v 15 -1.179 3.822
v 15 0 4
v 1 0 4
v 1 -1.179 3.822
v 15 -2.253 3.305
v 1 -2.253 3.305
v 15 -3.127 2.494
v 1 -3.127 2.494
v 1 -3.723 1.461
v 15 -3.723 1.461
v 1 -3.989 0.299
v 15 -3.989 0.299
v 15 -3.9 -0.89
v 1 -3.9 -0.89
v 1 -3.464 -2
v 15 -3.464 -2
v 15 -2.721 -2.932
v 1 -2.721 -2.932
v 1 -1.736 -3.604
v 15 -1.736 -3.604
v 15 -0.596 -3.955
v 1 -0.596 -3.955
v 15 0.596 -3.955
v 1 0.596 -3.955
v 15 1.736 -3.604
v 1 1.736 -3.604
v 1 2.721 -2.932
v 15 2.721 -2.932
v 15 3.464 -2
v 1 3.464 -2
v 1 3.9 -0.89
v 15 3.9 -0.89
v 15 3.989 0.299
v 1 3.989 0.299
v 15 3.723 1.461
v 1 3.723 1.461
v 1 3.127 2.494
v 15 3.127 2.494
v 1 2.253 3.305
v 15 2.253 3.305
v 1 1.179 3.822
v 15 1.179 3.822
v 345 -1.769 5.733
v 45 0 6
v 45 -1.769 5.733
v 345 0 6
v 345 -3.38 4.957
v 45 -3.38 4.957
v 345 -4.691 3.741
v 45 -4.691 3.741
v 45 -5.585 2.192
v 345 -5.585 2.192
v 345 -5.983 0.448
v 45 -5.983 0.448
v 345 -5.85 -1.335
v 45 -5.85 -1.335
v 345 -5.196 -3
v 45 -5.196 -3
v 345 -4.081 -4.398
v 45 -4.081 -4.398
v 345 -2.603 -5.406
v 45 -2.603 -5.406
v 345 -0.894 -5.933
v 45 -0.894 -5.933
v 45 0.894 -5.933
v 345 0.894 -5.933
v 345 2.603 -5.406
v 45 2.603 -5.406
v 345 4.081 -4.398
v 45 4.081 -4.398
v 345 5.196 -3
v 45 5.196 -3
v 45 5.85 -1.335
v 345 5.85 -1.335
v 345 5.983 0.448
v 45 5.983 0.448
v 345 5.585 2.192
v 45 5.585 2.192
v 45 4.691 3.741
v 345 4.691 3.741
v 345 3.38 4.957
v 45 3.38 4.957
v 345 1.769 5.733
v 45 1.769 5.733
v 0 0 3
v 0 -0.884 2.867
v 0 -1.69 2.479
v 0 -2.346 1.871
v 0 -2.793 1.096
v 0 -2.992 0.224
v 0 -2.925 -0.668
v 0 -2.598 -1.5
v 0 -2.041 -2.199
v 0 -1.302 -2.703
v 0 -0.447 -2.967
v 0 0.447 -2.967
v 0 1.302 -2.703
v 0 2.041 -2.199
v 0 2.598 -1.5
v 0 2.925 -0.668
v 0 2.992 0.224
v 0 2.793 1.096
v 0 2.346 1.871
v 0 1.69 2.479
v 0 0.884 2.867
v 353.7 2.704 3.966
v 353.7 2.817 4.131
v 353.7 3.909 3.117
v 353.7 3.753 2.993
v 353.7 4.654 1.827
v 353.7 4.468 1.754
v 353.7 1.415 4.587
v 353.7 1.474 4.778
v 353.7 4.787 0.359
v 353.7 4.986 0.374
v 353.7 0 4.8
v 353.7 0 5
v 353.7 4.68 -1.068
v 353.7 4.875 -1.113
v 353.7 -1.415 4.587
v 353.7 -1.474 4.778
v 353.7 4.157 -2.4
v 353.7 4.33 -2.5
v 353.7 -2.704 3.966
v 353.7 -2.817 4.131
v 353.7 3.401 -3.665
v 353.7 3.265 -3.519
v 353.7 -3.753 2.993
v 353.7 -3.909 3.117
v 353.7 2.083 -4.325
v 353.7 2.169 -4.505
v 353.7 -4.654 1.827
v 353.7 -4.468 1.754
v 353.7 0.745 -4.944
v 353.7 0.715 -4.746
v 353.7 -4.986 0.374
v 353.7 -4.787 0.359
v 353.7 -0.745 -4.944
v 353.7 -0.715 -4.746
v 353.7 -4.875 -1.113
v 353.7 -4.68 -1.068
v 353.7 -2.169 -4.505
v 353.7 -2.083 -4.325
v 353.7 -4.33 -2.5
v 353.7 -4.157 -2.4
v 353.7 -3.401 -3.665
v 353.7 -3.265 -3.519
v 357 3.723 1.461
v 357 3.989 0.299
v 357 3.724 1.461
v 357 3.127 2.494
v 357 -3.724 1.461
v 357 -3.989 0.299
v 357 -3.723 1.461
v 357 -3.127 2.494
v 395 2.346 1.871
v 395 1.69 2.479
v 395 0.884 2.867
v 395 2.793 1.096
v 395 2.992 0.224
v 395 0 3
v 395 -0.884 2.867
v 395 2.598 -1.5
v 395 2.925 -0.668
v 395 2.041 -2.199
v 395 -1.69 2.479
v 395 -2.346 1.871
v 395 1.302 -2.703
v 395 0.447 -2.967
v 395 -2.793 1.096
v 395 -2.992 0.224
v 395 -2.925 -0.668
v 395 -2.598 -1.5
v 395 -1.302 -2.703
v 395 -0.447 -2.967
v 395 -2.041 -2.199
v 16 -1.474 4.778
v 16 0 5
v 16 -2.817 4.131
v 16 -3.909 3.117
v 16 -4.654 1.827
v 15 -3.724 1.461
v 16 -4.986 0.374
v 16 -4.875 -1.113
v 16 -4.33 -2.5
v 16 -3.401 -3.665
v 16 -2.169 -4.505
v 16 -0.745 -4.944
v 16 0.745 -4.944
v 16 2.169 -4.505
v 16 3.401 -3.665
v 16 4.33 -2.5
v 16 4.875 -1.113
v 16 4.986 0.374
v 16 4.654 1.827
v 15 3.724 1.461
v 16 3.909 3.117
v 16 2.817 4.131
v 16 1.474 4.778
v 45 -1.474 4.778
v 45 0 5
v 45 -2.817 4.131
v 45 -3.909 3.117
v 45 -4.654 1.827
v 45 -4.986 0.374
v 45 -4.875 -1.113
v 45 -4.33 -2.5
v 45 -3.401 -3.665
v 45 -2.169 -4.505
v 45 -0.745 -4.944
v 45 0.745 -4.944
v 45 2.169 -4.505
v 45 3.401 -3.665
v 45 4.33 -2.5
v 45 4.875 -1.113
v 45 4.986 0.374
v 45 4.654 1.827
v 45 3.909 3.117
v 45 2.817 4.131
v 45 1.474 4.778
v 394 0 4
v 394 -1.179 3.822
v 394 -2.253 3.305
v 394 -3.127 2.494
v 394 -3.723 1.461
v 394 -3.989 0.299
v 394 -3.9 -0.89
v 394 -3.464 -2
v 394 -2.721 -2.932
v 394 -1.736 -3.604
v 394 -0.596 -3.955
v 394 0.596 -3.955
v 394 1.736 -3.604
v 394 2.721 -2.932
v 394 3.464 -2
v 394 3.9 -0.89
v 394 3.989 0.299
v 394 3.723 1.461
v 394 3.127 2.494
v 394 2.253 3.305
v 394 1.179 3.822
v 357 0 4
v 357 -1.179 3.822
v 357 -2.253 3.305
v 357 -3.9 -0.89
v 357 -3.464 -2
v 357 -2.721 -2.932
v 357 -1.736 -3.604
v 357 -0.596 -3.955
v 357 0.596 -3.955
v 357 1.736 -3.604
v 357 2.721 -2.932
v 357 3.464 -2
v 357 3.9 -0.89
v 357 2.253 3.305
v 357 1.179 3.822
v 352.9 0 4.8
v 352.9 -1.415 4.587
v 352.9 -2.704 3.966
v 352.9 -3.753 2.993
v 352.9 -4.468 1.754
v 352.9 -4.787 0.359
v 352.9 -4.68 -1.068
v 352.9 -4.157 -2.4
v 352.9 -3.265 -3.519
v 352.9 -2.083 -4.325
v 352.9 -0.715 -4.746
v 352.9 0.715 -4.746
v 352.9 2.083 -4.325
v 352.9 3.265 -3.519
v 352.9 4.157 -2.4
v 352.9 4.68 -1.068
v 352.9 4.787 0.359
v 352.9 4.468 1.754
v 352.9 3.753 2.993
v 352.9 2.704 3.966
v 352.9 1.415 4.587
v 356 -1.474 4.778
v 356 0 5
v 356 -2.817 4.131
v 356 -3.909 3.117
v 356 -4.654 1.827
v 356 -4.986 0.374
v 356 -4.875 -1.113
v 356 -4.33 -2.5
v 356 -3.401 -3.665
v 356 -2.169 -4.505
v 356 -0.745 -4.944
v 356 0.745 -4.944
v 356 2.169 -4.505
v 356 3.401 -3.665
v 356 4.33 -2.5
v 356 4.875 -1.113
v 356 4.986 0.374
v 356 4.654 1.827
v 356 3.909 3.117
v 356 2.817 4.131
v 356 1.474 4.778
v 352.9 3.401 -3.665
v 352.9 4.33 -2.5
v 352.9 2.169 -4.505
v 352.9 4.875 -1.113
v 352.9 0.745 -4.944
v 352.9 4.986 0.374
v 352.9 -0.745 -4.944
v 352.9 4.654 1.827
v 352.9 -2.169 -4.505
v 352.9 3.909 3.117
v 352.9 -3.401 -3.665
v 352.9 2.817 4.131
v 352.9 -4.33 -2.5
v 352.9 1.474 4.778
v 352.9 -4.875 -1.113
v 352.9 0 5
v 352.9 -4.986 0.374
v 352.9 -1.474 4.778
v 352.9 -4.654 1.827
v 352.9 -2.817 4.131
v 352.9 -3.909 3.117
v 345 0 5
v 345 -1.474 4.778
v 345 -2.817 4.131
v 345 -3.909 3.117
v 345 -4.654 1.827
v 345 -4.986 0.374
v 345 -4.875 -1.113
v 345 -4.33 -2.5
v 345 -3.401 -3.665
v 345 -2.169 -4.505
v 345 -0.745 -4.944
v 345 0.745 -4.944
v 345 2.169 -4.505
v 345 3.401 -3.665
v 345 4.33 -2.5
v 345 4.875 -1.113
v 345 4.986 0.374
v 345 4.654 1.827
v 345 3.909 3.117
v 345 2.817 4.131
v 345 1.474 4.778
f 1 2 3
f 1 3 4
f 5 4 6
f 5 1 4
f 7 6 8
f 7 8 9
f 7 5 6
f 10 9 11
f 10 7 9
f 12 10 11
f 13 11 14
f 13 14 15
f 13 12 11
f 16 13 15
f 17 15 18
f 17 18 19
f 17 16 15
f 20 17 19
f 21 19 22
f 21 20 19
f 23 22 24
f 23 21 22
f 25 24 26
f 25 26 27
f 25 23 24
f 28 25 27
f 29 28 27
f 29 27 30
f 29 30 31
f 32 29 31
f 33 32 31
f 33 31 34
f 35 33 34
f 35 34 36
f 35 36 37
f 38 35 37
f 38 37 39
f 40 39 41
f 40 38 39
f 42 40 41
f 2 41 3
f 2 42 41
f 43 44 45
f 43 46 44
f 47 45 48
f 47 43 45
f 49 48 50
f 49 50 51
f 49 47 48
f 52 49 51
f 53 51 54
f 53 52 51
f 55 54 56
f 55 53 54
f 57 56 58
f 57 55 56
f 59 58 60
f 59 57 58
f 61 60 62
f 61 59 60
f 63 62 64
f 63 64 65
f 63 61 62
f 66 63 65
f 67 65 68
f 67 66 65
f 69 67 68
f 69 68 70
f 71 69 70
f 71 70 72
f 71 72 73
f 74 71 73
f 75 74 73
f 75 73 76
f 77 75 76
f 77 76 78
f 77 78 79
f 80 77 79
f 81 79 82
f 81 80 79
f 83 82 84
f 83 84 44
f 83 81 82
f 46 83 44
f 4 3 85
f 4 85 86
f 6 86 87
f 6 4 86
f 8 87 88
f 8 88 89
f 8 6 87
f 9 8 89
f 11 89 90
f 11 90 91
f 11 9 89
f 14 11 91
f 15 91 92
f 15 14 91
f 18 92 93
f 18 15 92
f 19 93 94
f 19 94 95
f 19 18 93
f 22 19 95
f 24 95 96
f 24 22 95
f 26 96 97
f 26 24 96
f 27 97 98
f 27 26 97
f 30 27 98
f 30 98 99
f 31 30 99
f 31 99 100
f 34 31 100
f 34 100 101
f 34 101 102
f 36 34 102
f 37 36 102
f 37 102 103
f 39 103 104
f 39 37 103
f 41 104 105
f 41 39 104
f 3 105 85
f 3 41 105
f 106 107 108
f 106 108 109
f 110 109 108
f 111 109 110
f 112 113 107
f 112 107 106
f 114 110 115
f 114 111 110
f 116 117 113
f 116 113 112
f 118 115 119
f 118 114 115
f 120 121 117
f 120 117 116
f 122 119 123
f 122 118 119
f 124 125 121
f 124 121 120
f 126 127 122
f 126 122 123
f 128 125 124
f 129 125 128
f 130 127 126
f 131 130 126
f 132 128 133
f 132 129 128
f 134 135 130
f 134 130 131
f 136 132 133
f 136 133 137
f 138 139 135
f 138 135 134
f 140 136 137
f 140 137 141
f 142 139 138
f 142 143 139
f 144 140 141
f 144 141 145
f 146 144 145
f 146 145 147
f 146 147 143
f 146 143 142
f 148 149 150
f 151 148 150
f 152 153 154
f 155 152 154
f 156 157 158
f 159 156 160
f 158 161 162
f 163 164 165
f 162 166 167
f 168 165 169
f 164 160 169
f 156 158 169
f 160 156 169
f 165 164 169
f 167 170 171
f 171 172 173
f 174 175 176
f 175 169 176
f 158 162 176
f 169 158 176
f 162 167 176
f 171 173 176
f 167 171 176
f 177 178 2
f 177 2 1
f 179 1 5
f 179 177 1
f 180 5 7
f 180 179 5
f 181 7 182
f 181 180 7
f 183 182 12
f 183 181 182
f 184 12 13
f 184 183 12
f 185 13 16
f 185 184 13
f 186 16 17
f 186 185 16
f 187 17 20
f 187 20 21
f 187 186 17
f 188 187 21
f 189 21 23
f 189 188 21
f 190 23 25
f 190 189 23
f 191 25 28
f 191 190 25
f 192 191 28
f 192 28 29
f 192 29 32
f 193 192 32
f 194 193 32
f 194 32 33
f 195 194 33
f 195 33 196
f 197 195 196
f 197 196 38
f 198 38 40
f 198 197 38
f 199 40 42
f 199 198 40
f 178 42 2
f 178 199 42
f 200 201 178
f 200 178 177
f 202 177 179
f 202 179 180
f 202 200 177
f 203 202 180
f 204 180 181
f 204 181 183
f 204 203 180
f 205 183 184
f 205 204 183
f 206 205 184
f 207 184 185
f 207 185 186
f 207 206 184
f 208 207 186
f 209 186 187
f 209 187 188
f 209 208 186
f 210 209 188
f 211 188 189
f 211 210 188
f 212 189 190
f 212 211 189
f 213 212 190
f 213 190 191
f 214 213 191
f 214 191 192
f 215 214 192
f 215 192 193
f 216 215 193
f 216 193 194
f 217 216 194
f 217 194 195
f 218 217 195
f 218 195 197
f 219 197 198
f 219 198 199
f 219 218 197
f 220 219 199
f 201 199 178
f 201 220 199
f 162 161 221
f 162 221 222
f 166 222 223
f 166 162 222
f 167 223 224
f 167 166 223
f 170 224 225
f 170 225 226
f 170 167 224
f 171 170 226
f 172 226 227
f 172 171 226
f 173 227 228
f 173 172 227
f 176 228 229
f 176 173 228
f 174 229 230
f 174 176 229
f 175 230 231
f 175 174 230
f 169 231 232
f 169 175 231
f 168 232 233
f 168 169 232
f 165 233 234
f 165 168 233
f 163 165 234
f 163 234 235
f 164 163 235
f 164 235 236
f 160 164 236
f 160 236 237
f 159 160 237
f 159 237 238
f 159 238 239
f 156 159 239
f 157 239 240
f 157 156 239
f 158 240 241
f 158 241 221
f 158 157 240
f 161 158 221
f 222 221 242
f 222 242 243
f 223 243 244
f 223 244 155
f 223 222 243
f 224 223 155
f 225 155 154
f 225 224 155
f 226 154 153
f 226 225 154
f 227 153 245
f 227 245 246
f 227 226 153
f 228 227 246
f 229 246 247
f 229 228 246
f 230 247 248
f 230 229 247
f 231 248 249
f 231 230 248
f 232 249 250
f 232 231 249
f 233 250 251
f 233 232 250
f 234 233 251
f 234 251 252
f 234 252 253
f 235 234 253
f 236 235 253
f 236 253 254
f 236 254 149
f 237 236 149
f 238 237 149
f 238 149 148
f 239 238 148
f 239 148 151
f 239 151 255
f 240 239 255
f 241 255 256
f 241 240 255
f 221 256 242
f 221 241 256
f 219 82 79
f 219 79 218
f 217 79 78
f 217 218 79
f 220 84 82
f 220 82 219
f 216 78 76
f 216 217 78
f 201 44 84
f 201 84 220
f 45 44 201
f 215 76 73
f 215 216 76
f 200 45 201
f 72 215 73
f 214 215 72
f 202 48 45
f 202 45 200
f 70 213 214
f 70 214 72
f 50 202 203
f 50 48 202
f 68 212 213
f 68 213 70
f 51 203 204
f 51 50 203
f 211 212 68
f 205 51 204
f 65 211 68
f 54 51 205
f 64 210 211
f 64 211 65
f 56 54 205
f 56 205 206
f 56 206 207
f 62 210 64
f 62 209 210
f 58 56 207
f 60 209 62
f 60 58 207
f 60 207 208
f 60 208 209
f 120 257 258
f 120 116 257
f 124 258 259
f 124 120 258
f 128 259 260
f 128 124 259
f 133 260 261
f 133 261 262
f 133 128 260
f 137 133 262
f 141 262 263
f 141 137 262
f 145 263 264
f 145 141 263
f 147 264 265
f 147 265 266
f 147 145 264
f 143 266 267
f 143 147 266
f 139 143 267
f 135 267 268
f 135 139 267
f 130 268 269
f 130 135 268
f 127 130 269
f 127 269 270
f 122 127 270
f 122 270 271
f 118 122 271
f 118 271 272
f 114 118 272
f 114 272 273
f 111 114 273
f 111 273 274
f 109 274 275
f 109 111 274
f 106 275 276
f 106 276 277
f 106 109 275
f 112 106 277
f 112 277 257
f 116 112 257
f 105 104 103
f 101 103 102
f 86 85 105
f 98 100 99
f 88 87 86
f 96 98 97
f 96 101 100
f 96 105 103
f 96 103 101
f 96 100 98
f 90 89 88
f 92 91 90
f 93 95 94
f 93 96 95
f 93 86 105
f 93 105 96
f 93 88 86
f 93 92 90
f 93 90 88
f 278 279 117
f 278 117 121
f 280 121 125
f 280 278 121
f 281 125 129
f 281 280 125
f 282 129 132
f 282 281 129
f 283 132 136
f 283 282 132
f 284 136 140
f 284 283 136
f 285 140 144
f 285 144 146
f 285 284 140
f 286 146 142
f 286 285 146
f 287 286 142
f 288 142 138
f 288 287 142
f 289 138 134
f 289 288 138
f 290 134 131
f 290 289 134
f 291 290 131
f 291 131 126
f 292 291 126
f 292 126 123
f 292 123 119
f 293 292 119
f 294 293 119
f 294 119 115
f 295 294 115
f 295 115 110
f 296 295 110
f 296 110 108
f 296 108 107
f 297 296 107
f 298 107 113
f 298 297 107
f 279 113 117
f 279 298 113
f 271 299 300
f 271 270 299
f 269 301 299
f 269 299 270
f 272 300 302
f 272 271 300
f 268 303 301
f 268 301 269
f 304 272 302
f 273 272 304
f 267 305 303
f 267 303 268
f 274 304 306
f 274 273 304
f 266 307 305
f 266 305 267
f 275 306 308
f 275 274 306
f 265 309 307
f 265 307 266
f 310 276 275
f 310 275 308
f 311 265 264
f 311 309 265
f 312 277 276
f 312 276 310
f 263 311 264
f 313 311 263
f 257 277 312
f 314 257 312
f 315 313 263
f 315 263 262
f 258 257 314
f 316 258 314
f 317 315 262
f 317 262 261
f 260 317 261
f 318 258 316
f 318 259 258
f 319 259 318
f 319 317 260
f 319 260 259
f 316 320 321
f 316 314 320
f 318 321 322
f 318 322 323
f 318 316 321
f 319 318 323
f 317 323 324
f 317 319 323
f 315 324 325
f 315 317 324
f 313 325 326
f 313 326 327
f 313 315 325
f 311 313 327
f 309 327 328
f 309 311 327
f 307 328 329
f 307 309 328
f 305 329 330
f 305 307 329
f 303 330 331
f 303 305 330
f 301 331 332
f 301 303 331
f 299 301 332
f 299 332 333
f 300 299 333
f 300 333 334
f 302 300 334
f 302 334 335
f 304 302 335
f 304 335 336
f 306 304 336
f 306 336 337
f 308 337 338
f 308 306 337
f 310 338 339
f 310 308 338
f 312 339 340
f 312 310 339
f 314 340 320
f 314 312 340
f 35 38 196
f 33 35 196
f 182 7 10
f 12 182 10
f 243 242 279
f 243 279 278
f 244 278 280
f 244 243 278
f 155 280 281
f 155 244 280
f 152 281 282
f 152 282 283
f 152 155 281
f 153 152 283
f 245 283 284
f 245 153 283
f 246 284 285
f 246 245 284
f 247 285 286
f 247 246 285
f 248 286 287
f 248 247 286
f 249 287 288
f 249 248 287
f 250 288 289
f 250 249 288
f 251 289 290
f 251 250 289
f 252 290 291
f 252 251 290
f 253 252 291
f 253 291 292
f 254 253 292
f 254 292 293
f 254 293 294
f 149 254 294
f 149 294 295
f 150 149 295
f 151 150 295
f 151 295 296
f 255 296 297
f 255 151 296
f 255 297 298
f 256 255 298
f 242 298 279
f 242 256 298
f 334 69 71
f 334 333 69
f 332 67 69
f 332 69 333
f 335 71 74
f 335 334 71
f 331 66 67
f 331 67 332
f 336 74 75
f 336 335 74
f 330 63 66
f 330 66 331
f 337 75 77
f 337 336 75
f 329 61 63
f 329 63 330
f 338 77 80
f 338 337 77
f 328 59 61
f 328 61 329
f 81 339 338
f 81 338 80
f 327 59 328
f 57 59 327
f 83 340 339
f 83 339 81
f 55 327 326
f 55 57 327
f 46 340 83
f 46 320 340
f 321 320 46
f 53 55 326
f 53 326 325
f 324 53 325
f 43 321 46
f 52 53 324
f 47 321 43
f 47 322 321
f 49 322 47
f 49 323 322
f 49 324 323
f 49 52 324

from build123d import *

# Parameters (mm, degrees)
SKETCH_1_W     = 38
SKETCH_1_H     = 4
CHAMFER_1_SIZE = 1


with BuildPart() as part:
    # 草图1 → 旋转1 (revolve)
    with BuildSketch(Plane.XY, mode=Mode.PRIVATE) as revolve_1_sk:
        Polygon((0, 0), (0, 4), (15, 4), (15, 5), (45, 5), (45, 6), (345, 6), (345, 5), (352.9, 5), (352.9, 4.8), (353.7, 4.8), (353.7, 5), (357, 5), (357, 0), align=None)
        with Locations((376, 2)):
            Rectangle(SKETCH_1_W, SKETCH_1_H)
    revolve(revolve_1_sk.sketch.rotate(Axis((0, 0, 0), (1, 0, 0)), 90), axis=Axis((0, 0, 0), (1, 0, 0)))

    # 倒角1
    chamfer_1_edges = [part.edges().sort_by_distance(p)[0] for p in [
        (0, 0, -4),
        (15, 0, -5),
        (357, 0, -5),
        (395, 0, -4),
    ]]
    chamfer(chamfer_1_edges, length=CHAMFER_1_SIZE - 0.0001)  # a hair under: the kernel refuses the full size


solid = part.part
